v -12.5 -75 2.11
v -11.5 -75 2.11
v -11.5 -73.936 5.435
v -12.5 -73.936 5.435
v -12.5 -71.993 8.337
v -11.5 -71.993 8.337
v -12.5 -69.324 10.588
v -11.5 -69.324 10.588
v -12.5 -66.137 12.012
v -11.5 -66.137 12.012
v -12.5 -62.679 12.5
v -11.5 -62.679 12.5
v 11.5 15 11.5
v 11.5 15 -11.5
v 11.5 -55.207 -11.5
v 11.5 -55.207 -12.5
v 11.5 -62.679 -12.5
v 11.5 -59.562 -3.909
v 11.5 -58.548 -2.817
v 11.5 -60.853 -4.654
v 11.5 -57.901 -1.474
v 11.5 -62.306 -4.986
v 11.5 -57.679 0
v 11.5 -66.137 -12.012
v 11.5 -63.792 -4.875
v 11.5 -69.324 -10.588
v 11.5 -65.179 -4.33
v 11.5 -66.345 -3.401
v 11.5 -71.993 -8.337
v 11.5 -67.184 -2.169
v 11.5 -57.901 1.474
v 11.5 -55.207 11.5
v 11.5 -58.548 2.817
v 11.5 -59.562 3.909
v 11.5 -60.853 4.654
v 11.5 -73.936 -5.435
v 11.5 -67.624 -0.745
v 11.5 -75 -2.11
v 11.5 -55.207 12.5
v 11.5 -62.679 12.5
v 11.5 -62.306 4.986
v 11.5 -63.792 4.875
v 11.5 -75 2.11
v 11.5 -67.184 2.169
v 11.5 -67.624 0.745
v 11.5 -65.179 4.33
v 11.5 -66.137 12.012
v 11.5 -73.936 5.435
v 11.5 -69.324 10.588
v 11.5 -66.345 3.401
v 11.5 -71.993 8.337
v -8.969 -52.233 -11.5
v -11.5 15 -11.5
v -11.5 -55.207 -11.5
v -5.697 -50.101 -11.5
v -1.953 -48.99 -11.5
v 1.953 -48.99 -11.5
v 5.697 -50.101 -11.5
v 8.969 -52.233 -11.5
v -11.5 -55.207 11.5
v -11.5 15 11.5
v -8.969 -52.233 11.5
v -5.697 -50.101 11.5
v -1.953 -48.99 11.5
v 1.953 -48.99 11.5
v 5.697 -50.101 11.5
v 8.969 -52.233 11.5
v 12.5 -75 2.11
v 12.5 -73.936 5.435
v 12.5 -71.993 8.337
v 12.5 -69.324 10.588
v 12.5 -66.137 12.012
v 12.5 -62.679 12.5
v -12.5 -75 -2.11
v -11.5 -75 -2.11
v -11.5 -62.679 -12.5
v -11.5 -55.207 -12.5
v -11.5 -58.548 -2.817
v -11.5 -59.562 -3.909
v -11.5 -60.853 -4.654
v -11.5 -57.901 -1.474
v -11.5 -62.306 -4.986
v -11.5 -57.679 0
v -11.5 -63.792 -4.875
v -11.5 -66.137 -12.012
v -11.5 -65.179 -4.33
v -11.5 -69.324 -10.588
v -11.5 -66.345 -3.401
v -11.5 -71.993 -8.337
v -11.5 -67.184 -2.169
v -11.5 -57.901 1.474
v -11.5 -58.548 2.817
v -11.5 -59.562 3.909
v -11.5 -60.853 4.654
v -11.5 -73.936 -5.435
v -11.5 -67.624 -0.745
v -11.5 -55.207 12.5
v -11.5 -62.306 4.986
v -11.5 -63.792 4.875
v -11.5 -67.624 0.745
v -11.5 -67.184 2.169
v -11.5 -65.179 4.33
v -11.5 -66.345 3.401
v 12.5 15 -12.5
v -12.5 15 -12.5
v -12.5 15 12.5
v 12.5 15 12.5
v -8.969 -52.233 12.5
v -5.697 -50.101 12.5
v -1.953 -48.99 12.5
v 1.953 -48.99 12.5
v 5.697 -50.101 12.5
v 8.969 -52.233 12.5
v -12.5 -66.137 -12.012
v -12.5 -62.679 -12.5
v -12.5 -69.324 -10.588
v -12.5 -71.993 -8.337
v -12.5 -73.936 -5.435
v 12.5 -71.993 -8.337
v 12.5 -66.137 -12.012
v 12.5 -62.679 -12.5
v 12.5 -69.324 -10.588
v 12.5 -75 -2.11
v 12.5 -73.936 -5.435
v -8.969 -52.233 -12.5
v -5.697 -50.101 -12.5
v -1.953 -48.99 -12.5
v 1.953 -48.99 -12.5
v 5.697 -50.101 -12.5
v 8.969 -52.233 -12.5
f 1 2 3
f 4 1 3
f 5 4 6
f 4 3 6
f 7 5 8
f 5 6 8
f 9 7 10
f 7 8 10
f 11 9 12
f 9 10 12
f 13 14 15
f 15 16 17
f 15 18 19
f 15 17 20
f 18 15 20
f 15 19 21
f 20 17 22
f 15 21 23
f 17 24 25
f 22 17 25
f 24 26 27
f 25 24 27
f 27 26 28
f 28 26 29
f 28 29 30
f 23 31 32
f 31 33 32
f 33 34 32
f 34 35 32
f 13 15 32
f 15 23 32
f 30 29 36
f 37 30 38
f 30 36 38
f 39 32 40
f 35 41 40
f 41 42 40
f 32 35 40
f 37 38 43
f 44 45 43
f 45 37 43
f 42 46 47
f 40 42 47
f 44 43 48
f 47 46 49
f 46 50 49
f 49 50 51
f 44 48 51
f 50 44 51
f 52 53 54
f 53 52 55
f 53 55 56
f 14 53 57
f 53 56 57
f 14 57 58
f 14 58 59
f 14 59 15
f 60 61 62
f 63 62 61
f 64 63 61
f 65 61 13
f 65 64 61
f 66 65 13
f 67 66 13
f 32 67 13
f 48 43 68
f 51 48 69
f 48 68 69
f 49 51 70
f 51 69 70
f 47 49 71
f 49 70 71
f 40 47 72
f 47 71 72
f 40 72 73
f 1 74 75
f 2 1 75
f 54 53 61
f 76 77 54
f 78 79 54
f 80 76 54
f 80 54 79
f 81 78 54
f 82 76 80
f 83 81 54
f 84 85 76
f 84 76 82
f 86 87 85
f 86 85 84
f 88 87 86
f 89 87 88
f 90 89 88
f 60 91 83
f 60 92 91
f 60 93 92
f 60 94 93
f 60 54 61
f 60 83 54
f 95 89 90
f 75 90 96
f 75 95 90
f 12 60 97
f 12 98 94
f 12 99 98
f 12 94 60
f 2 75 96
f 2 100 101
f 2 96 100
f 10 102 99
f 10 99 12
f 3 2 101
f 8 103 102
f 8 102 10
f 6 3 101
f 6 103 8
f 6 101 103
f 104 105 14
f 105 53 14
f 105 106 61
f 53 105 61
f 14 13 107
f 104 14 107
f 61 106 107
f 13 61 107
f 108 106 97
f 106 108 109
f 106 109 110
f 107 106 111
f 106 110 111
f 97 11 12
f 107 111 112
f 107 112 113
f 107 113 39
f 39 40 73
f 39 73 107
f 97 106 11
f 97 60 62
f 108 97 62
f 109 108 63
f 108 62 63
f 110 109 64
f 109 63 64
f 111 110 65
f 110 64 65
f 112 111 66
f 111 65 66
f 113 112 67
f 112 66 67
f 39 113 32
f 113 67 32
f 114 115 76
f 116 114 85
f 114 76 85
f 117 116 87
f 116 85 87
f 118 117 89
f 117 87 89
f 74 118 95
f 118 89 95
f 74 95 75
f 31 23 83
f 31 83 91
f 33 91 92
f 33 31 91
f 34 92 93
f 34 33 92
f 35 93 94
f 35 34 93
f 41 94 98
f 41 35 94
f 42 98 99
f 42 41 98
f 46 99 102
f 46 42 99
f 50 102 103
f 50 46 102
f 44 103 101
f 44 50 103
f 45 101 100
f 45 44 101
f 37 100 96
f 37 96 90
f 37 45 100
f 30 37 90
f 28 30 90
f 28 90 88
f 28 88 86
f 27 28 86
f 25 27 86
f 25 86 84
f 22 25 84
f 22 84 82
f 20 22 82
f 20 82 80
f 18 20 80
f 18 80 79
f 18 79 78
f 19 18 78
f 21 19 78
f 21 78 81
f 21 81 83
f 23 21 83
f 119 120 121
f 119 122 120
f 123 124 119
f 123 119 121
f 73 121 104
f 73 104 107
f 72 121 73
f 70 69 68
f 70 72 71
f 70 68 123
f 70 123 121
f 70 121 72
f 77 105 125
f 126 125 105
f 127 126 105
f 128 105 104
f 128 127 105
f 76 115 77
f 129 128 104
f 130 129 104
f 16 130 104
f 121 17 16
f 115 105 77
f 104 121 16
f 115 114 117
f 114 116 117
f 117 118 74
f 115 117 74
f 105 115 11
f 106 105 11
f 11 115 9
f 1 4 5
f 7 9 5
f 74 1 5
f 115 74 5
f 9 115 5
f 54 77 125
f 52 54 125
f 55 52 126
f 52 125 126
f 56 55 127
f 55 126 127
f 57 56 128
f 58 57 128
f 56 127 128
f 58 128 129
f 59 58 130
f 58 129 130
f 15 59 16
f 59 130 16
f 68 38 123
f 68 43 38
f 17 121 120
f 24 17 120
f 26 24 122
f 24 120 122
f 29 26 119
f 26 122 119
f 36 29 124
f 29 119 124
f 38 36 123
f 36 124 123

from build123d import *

# Parameters (mm, degrees)
F0_W      = 25
F0_H      = 25
F1_DEPTH  = 75
F2_W      = 23
F2_H      = 23
F3_DEPTH  = 75.001
F5_DEPTH  = 25
F7_DEPTH  = 25
F8_R      = 5
F9_DEPTH  = 25
F11_DEPTH = 25
F12_W     = 25
F12_H     = 25
F12_W_2   = 23
F12_H_2   = 23
F13_DEPTH = 15


with BuildPart() as f1:
    # F0 (on Front) → F1 (new body)
    with BuildSketch(Plane.XZ):
        Rectangle(F0_W, F0_H)
    extrude(amount=F1_DEPTH)

    # F2 (on face) → F3 (cut, through all)
    with BuildSketch(Plane.XZ.offset(75)):
        Rectangle(F2_W, F2_H)
    extrude(amount=-F3_DEPTH, mode=Mode.SUBTRACT)

    # F4 (on face) → F5 (cut)
    with BuildSketch(Plane.YZ.offset(12.5)):
        with BuildLine():
            ThreePointArc((-62.679358, -12.5), (-75.179358, 0), (-62.679358, 12.5))
            Line((-62.679358, 12.5), (-82.116477, 25.394978))
            Line((-82.116477, 25.394978), (-83.688773, -18.652776))
            Line((-83.688773, -18.652776), (-60.308628, -22.777025))
            Line((-60.308628, -22.777025), (-62.679358, -12.5))
        make_face()
    extrude(amount=-F5_DEPTH, mode=Mode.SUBTRACT)

    # F6 (on face) → F7 (cut)
    with BuildSketch(Plane.XY.offset(12.5)):
        Polygon((-11.5, -67.578337), (-11.5, -75), (11.5, -75), (11.5, -67.578337), (11.5, -55.207212), (-11.5, -55.207212), align=None)
    extrude(amount=-F7_DEPTH, mode=Mode.SUBTRACT)

    # F8 (on face) → F9 (join)
    with BuildSketch(Plane.YZ.offset(12.5)):
        with Locations((-62.679358, 0)):
            Circle(F8_R)
    extrude(amount=-F9_DEPTH)

    # F10 (on face) → F11 (cut)
    with BuildSketch(Plane(origin=(0, 0, -12.5), x_dir=(1, 0, 0), z_dir=(0, 0, -1))):
        with BuildLine():
            Line((11.5, 55.207212), (-11.5, 55.207212))
            ThreePointArc((-11.5, 55.207212), (0, 48.848382), (11.5, 55.207212))
        make_face()
    extrude(amount=-F11_DEPTH, mode=Mode.SUBTRACT)

    # F12 (on face) → F13 (join)
    with BuildSketch(Plane.XZ):
        Rectangle(F12_W, F12_H)
        Rectangle(F12_W_2, F12_H_2, mode=Mode.SUBTRACT)
    extrude(amount=-F13_DEPTH)


solid = f1.part
